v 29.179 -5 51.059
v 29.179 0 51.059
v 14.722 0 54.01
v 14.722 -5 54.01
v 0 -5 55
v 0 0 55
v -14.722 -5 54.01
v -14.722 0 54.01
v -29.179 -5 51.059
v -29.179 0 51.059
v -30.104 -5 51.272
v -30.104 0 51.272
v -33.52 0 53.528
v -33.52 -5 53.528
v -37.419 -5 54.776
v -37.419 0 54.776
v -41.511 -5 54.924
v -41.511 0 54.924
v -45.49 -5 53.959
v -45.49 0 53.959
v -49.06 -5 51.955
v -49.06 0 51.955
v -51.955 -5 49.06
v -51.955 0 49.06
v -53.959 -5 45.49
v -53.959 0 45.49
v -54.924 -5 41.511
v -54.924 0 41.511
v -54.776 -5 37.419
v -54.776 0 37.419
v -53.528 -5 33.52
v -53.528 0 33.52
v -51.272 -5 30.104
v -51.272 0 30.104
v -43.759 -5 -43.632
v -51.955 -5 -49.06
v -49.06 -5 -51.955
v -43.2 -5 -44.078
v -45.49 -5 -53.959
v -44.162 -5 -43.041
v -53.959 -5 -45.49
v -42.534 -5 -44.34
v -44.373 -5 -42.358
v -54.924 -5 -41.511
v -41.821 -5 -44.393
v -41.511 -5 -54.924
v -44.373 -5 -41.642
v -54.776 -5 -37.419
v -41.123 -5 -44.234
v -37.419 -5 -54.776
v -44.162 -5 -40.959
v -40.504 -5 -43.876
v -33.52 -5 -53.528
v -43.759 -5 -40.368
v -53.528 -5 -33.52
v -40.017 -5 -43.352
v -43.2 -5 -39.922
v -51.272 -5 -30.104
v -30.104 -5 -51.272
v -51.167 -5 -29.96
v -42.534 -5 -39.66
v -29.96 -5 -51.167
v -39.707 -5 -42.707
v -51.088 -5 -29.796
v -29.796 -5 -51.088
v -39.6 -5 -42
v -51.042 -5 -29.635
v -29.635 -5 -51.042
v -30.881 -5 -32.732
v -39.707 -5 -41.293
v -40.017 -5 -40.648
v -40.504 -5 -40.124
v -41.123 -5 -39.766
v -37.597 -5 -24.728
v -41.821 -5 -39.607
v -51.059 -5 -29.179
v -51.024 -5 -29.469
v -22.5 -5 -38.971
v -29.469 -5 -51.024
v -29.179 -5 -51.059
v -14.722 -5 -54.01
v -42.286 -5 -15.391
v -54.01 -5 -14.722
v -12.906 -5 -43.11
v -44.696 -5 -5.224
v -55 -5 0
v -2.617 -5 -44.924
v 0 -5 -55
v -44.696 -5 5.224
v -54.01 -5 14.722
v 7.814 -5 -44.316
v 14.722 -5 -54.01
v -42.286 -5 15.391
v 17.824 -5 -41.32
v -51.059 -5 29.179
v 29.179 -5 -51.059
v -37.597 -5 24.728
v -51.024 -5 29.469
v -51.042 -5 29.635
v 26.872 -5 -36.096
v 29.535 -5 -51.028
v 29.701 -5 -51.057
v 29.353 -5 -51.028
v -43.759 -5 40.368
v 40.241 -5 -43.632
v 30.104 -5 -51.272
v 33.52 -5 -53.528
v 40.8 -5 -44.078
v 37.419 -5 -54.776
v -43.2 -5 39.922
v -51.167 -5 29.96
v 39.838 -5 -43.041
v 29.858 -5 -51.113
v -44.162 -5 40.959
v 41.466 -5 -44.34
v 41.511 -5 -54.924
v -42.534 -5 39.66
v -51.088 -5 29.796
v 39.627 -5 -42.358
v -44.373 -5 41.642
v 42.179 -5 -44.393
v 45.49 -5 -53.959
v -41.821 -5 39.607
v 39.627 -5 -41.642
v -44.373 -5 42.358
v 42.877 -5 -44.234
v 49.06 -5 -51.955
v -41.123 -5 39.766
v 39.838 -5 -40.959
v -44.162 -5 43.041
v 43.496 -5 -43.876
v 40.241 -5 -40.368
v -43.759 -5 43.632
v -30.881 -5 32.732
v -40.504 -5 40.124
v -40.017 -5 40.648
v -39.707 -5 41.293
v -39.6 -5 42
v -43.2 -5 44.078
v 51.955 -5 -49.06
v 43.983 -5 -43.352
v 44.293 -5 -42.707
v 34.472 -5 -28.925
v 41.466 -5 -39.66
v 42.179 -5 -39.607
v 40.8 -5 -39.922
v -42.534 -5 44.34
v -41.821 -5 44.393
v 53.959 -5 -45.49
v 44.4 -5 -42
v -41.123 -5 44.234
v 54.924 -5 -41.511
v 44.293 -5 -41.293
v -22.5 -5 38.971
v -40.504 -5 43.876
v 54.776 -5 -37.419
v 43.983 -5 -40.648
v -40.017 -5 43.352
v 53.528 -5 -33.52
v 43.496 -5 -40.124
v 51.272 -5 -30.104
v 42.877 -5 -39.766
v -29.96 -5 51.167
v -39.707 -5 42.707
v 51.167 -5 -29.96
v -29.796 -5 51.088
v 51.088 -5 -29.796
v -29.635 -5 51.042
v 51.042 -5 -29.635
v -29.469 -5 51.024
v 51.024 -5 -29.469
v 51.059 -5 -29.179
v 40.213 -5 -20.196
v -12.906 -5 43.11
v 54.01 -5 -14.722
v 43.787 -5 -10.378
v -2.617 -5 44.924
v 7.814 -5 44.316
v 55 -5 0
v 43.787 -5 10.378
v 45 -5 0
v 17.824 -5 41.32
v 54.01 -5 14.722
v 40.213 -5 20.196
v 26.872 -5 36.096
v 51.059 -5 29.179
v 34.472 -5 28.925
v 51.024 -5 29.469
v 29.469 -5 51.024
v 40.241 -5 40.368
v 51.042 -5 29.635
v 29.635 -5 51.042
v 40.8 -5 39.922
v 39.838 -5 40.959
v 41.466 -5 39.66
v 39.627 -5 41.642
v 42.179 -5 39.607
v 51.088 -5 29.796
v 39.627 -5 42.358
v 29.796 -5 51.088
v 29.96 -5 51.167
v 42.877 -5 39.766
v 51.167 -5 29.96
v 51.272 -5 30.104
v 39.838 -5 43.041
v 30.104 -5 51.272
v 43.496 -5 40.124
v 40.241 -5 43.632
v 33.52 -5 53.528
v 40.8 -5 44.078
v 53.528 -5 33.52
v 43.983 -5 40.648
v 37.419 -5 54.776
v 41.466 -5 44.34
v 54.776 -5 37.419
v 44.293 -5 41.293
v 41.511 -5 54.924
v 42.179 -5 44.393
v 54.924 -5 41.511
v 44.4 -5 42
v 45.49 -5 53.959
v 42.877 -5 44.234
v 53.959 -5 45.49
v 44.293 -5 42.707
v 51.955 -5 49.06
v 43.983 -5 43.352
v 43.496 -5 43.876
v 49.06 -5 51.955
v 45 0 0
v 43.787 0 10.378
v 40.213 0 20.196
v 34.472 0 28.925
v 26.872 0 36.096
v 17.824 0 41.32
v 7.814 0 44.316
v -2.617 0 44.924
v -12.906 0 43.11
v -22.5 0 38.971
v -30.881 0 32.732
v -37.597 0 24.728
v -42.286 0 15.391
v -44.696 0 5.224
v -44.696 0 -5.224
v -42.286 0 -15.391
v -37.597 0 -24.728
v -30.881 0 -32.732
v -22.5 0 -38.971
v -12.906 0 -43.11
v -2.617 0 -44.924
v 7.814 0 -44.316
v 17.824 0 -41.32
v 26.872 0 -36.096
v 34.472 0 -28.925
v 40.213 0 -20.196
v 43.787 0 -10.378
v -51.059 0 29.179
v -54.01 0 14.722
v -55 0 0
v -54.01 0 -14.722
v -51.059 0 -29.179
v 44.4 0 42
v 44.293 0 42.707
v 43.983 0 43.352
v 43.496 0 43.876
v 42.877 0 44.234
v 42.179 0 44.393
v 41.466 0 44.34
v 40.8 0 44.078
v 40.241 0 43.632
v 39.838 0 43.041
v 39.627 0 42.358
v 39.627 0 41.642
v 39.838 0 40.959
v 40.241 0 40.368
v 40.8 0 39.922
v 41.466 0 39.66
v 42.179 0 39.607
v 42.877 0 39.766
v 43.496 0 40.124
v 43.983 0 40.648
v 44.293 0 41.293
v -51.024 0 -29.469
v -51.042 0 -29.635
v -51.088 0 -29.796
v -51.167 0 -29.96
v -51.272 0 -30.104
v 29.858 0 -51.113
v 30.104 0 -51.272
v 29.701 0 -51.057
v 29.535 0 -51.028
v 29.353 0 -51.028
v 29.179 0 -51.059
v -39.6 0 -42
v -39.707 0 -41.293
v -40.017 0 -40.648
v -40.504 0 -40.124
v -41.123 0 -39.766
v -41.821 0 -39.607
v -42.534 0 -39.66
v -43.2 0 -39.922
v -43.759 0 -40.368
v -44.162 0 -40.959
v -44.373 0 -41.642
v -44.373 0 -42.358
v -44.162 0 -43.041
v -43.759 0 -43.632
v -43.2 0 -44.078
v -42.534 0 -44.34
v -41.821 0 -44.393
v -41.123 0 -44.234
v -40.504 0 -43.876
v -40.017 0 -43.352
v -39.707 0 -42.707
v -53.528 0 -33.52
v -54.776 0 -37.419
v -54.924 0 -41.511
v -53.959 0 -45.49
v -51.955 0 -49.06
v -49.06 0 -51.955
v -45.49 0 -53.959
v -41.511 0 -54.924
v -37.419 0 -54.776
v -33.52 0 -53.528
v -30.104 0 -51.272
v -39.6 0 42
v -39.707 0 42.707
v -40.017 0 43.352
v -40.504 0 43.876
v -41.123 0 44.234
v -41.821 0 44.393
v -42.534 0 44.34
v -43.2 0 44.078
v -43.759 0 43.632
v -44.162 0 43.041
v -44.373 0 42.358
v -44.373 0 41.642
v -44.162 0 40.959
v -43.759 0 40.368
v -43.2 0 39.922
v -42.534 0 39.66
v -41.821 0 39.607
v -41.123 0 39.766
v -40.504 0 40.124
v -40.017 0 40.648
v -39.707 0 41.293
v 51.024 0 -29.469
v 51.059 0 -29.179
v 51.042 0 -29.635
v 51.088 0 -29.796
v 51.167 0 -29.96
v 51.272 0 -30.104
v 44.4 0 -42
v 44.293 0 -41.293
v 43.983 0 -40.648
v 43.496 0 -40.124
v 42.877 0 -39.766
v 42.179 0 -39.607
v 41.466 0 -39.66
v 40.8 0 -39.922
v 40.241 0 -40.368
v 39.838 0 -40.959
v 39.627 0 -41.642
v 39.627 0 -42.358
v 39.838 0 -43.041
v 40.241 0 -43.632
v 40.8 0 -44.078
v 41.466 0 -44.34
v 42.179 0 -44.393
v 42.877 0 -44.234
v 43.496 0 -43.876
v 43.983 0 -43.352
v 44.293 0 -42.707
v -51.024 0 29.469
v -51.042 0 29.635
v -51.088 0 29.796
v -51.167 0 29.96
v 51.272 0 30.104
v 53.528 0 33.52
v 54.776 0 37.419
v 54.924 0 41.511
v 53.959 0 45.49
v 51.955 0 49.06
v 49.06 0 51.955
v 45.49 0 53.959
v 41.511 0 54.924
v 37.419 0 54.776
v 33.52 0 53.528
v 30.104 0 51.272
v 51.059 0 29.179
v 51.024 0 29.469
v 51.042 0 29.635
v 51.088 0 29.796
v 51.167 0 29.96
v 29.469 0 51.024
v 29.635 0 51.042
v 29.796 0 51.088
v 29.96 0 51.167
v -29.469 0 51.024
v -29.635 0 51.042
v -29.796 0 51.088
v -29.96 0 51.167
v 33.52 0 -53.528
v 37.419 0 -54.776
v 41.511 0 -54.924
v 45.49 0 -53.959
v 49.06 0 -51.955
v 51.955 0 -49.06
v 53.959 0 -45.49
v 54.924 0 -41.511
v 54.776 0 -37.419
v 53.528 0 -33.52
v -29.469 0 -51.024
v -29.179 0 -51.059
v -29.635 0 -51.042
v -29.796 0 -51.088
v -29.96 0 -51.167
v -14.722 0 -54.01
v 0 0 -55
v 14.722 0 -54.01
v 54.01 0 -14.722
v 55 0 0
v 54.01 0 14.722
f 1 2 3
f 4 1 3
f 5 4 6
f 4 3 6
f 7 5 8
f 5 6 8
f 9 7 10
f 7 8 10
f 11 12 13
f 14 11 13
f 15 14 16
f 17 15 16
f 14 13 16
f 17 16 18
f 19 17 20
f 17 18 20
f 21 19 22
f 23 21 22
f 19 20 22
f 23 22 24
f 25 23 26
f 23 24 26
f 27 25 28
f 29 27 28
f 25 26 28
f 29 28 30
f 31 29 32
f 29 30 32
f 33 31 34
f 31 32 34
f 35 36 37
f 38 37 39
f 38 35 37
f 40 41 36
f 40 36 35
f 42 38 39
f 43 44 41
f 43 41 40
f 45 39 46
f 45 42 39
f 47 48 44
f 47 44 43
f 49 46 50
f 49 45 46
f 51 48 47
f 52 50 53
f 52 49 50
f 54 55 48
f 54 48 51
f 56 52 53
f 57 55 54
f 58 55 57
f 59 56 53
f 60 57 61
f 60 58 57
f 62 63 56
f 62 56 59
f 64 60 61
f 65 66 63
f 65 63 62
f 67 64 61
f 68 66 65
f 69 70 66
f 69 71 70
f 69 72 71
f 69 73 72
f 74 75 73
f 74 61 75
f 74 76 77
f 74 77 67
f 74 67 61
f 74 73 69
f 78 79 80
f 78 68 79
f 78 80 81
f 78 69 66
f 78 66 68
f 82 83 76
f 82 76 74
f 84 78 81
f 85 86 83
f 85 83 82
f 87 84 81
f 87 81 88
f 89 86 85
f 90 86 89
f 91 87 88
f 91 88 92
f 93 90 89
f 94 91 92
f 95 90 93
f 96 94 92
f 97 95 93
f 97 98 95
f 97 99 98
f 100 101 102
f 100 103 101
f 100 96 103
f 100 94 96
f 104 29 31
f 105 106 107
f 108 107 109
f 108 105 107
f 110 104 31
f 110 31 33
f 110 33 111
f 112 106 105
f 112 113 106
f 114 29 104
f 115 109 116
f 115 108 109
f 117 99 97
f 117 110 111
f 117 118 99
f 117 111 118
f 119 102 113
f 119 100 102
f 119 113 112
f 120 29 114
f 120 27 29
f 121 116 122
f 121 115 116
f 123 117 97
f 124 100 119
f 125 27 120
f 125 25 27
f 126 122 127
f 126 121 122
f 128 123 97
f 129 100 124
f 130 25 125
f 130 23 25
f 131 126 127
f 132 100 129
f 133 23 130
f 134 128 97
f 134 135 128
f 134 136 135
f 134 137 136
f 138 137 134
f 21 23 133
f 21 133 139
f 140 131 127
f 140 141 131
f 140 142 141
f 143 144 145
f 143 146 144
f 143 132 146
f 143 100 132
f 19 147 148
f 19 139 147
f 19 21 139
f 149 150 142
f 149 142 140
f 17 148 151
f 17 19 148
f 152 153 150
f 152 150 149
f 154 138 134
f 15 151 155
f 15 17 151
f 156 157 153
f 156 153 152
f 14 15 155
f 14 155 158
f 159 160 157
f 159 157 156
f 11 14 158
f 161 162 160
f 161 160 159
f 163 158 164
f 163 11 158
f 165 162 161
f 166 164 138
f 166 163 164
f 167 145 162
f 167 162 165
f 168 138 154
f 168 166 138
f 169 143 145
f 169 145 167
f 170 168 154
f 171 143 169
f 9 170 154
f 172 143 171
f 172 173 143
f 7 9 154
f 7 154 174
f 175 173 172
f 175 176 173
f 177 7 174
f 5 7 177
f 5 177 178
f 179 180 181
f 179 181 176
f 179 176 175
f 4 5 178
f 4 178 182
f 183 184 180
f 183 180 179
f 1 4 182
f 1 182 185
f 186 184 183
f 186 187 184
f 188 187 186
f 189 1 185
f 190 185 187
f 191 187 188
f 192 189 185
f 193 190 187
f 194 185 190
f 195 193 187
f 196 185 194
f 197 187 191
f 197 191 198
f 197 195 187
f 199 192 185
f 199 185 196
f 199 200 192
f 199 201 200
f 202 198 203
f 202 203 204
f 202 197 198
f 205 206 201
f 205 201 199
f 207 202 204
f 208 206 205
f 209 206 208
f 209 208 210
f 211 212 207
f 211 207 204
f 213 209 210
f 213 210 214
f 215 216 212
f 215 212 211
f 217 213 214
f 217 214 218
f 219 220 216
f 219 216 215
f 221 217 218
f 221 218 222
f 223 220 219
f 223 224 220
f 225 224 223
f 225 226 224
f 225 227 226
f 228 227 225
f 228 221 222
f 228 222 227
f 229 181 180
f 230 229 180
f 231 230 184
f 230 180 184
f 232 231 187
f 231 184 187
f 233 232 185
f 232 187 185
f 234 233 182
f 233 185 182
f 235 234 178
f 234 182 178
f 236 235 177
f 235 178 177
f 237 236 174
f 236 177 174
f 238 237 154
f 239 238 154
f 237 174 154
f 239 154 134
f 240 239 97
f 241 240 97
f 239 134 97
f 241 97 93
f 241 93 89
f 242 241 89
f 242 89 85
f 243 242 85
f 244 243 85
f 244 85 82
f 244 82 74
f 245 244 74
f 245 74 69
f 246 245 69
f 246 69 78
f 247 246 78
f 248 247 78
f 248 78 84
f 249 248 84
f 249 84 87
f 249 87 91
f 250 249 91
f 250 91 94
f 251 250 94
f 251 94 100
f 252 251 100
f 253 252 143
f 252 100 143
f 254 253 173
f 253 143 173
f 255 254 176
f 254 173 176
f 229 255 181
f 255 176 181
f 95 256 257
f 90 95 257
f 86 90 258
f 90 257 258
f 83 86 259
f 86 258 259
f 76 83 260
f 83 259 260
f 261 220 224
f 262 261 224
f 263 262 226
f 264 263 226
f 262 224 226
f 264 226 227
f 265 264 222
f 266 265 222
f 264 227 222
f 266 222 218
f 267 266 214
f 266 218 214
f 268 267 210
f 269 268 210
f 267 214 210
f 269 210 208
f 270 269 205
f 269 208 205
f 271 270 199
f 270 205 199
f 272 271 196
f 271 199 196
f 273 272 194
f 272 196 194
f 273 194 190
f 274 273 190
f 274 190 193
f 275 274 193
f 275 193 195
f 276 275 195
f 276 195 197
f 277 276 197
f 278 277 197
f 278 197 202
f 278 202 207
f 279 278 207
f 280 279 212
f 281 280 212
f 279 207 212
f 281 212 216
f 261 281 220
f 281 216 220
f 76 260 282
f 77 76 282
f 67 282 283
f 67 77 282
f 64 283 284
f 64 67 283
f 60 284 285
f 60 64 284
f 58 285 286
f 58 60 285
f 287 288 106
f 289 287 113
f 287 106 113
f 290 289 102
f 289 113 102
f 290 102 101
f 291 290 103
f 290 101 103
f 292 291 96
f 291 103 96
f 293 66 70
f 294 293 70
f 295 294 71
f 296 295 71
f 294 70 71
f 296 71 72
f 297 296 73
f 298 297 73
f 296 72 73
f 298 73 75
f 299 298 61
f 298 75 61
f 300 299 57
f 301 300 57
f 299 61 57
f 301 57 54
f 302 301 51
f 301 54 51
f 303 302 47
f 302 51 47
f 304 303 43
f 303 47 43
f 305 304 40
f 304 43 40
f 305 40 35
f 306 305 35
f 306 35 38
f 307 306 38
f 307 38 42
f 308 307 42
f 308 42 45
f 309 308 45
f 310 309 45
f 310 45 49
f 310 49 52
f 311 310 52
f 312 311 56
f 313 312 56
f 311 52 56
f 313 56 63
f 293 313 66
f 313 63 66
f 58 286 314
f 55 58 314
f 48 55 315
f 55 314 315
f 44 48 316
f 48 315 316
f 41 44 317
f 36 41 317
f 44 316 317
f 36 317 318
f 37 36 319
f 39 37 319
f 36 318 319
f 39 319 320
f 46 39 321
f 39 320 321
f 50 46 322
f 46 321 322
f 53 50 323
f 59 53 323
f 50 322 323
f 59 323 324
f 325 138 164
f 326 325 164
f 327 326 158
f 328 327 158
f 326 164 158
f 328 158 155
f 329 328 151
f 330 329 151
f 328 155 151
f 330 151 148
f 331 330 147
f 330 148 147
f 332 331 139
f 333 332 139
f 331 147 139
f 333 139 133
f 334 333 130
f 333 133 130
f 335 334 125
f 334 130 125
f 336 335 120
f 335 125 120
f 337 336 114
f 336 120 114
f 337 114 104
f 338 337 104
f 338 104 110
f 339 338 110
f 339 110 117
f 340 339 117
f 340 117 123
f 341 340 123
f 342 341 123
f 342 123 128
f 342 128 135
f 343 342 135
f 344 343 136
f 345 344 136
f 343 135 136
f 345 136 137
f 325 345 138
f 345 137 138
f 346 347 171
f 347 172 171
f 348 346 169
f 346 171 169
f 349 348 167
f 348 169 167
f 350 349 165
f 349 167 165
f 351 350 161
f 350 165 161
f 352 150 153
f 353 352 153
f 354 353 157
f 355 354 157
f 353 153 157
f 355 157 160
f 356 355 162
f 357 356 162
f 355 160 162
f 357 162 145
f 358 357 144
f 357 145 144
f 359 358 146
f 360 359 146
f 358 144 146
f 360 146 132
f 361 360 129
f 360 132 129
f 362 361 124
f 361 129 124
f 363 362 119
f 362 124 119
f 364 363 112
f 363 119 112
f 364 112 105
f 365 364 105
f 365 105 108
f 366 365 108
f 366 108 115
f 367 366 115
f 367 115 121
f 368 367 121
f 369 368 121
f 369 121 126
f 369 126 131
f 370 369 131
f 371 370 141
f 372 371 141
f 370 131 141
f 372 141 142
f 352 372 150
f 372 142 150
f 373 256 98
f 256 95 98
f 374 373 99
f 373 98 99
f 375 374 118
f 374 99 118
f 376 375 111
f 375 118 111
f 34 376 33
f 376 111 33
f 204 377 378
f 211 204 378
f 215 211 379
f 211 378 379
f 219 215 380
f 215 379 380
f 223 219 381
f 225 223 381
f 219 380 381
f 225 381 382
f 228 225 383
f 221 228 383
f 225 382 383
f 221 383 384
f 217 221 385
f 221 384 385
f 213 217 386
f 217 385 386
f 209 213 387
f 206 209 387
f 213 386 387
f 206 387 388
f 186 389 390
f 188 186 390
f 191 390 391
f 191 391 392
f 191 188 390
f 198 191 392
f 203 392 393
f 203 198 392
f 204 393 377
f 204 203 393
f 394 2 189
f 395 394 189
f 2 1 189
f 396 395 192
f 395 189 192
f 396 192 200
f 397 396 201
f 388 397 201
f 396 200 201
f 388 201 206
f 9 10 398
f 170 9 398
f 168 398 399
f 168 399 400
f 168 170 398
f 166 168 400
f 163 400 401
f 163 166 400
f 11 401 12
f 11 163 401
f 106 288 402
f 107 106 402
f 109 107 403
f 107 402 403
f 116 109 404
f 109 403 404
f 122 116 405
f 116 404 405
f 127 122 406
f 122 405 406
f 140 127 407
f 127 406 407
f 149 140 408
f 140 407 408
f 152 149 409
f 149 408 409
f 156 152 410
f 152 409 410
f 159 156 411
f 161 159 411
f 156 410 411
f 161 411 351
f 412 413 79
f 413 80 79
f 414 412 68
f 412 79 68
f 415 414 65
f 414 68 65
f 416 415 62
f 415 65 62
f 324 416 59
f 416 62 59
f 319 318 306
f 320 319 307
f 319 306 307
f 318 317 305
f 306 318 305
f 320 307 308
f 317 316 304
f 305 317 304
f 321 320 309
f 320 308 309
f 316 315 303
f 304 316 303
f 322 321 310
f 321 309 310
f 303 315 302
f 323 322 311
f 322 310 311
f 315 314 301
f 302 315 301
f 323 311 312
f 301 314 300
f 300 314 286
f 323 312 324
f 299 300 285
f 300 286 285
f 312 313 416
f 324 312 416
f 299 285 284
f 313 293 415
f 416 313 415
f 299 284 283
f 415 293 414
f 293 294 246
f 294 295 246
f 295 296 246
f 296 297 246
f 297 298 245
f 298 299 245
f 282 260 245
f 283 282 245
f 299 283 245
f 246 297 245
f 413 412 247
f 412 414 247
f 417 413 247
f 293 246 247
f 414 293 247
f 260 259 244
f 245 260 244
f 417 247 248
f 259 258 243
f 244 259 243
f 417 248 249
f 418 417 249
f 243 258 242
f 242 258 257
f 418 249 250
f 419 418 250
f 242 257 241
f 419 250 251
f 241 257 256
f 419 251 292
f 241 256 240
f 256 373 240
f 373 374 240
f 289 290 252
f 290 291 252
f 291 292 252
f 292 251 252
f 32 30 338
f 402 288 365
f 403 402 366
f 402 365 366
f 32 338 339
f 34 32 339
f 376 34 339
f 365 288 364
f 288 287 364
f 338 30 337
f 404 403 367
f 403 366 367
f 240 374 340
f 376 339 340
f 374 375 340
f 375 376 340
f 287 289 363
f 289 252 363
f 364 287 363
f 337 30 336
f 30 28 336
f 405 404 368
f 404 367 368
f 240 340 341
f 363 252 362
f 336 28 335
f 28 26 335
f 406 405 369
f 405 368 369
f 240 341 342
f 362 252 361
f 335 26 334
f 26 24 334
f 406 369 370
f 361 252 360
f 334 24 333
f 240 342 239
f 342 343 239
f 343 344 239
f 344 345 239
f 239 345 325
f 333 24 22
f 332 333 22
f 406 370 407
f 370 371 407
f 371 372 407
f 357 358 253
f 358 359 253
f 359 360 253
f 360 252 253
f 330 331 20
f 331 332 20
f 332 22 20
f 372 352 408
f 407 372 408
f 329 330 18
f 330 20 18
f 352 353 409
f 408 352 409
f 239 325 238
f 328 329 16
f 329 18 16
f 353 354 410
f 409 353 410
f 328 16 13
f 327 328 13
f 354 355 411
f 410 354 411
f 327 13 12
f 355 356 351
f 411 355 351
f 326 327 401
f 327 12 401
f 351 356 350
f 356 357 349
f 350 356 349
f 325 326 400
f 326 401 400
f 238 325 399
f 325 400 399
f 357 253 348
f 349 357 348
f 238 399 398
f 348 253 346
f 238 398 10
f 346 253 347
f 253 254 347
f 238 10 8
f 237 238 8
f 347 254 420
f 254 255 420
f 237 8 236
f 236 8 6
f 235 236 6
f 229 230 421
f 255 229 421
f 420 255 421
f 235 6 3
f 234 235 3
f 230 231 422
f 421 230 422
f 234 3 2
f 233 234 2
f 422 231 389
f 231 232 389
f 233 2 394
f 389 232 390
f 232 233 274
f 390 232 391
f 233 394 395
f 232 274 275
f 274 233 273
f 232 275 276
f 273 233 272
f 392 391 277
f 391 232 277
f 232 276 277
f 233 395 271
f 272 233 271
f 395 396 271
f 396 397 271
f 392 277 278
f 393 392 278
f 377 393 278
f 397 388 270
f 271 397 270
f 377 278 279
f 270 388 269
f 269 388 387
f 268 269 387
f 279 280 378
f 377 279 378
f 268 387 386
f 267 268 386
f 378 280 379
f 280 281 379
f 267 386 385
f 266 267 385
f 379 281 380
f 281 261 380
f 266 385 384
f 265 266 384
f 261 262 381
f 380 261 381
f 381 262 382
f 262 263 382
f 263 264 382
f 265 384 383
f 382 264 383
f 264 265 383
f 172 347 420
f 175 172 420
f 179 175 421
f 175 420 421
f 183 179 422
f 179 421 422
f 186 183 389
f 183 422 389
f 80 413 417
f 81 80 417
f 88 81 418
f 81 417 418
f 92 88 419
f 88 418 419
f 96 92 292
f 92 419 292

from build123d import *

# Parameters (mm, degrees)
PAD_DEPTH       = 5
PAD001_DEPTH    = 5
SKETCH001_R     = 45
POCKET_DEPTH    = 5.001
FILLET_R        = 1
FILLET001_R     = 1
FILLET002_R     = 1
FILLET003_R     = 1
FILLET004_R     = 1
FILLET005_R     = 1
FILLET006_R     = 1
FILLET007_R     = 1
SKETCH002_R     = 2.4
POCKET001_DEPTH = 5


with BuildPart() as part:
    # Sketch → Pad (new body)
    with BuildSketch(Plane.XZ):
        with BuildLine():
            ThreePointArc((29.708208, 50.912333), (0, 55), (-29.708208, 50.912333))
            ThreePointArc((-29.708208, 50.912333), (-50.606602, 50.606602), (-50.912333, 29.708208))
            ThreePointArc((-50.912333, 29.708208), (-55, 0), (-50.912333, -29.708208))
            ThreePointArc((-50.912333, -29.708208), (-50.606602, -50.606602), (-29.708208, -50.912333))
            ThreePointArc((-29.708208, -50.912333), (0, -55), (29.708208, -50.912333))
            ThreePointArc((29.708208, -50.912333), (50.606602, -50.606602), (50.912333, -29.708208))
            ThreePointArc((50.912333, -29.708208), (55, 0), (50.912333, 29.708208))
            ThreePointArc((50.912333, 29.708208), (50.606602, 50.606602), (29.708208, 50.912333))
        make_face()
    extrude(amount=PAD_DEPTH)

    # Sketch → Pad001 (join)
    with BuildSketch(Plane.XZ):
        with BuildLine():
            ThreePointArc((29.708208, 50.912333), (0, 55), (-29.708208, 50.912333))
            ThreePointArc((-29.708208, 50.912333), (-50.606602, 50.606602), (-50.912333, 29.708208))
            ThreePointArc((-50.912333, 29.708208), (-55, 0), (-50.912333, -29.708208))
            ThreePointArc((-50.912333, -29.708208), (-50.606602, -50.606602), (-29.708208, -50.912333))
            ThreePointArc((-29.708208, -50.912333), (0, -55), (29.708208, -50.912333))
            ThreePointArc((29.708208, -50.912333), (50.606602, -50.606602), (50.912333, -29.708208))
            ThreePointArc((50.912333, -29.708208), (55, 0), (50.912333, 29.708208))
            ThreePointArc((50.912333, 29.708208), (50.606602, 50.606602), (29.708208, 50.912333))
        make_face()
    extrude(amount=PAD001_DEPTH)

    # Sketch001 (on Face5 of Pad001) → Pocket (cut, through all)
    with BuildSketch(Plane.XZ.offset(5)):
        Circle(SKETCH001_R)
    extrude(amount=-POCKET_DEPTH, mode=Mode.SUBTRACT)

    # Fillet
    fillet_edges = [part.edges().sort_by_distance(p)[0] for p in [
        (-29.708208, -2.5, 50.912333),
    ]]
    fillet(fillet_edges, radius=FILLET_R)

    # Fillet001
    fillet001_edges = [part.edges().sort_by_distance(p)[0] for p in [
        (29.708208, -2.5, 50.912333),
    ]]
    fillet(fillet001_edges, radius=FILLET001_R)

    # Fillet002
    fillet002_edges = [part.edges().sort_by_distance(p)[0] for p in [
        (50.912333, -2.5, -29.708208),
    ]]
    fillet(fillet002_edges, radius=FILLET002_R)

    # Fillet003
    fillet003_edges = [part.edges().sort_by_distance(p)[0] for p in [
        (50.912333, -2.5, 29.708208),
    ]]
    fillet(fillet003_edges, radius=FILLET003_R)

    # Fillet004
    fillet004_edges = [part.edges().sort_by_distance(p)[0] for p in [
        (29.708208, -2.5, -50.912333),
    ]]
    fillet(fillet004_edges, radius=FILLET004_R)

    # Fillet005
    fillet005_edges = [part.edges().sort_by_distance(p)[0] for p in [
        (-29.708208, -2.5, -50.912333),
    ]]
    fillet(fillet005_edges, radius=FILLET005_R)

    # Fillet006
    fillet006_edges = [part.edges().sort_by_distance(p)[0] for p in [
        (-50.912333, -2.5, 29.708208),
    ]]
    fillet(fillet006_edges, radius=FILLET006_R)

    # Fillet007
    fillet007_edges = [part.edges().sort_by_distance(p)[0] for p in [
        (-50.912333, -2.5, -29.708208),
    ]]
    fillet(fillet007_edges, radius=FILLET007_R)

    # Sketch002 (on Face19 of Fillet007) → Pocket001 (cut)
    with BuildSketch(Plane.XZ.offset(5)):
        with Locations((-42, 42)):
            Circle(SKETCH002_R)
        with Locations((42, 42)):
            Circle(SKETCH002_R)
        with Locations((42, -42)):
            Circle(SKETCH002_R)
        with Locations((-42, -42)):
            Circle(SKETCH002_R)
    extrude(amount=-POCKET001_DEPTH, mode=Mode.SUBTRACT)


solid = part.part
